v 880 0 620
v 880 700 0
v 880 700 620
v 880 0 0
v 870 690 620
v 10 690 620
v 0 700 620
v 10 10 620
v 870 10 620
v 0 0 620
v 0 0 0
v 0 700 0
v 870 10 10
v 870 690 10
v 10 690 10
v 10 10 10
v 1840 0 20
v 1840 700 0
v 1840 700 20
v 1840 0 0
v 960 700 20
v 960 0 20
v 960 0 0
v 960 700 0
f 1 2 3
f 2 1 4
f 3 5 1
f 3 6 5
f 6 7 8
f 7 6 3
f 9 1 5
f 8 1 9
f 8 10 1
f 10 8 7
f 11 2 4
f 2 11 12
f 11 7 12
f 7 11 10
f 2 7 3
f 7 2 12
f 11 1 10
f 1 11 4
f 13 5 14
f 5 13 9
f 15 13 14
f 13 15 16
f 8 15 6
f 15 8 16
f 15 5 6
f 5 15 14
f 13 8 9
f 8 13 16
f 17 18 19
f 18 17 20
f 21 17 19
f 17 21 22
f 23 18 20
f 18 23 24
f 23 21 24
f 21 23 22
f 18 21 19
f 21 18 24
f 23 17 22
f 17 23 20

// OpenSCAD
l=680;
w=860;
h=610;

wall_thickness=10;
base_thickness=10;
enclosure_height=10;
enclosure_bump=10;

module box(w, l, h, wt, bt) {
    difference() {
        cube([w + wt * 2, l + wt * 2, h + bt]);
        translate([wt, wt, bt])
            cube([w, l, h]);
    }
}

module box_enclosure(w, l, h, wt, bt) {
    cube([w + wt * 2, l + wt * 2, h + bt]);
}

box(w, l, h, wall_thickness, base_thickness);
translate([w + 100, 0, 0])
    box_enclosure(w, l, enclosure_height, wall_thickness, base_thickness);
